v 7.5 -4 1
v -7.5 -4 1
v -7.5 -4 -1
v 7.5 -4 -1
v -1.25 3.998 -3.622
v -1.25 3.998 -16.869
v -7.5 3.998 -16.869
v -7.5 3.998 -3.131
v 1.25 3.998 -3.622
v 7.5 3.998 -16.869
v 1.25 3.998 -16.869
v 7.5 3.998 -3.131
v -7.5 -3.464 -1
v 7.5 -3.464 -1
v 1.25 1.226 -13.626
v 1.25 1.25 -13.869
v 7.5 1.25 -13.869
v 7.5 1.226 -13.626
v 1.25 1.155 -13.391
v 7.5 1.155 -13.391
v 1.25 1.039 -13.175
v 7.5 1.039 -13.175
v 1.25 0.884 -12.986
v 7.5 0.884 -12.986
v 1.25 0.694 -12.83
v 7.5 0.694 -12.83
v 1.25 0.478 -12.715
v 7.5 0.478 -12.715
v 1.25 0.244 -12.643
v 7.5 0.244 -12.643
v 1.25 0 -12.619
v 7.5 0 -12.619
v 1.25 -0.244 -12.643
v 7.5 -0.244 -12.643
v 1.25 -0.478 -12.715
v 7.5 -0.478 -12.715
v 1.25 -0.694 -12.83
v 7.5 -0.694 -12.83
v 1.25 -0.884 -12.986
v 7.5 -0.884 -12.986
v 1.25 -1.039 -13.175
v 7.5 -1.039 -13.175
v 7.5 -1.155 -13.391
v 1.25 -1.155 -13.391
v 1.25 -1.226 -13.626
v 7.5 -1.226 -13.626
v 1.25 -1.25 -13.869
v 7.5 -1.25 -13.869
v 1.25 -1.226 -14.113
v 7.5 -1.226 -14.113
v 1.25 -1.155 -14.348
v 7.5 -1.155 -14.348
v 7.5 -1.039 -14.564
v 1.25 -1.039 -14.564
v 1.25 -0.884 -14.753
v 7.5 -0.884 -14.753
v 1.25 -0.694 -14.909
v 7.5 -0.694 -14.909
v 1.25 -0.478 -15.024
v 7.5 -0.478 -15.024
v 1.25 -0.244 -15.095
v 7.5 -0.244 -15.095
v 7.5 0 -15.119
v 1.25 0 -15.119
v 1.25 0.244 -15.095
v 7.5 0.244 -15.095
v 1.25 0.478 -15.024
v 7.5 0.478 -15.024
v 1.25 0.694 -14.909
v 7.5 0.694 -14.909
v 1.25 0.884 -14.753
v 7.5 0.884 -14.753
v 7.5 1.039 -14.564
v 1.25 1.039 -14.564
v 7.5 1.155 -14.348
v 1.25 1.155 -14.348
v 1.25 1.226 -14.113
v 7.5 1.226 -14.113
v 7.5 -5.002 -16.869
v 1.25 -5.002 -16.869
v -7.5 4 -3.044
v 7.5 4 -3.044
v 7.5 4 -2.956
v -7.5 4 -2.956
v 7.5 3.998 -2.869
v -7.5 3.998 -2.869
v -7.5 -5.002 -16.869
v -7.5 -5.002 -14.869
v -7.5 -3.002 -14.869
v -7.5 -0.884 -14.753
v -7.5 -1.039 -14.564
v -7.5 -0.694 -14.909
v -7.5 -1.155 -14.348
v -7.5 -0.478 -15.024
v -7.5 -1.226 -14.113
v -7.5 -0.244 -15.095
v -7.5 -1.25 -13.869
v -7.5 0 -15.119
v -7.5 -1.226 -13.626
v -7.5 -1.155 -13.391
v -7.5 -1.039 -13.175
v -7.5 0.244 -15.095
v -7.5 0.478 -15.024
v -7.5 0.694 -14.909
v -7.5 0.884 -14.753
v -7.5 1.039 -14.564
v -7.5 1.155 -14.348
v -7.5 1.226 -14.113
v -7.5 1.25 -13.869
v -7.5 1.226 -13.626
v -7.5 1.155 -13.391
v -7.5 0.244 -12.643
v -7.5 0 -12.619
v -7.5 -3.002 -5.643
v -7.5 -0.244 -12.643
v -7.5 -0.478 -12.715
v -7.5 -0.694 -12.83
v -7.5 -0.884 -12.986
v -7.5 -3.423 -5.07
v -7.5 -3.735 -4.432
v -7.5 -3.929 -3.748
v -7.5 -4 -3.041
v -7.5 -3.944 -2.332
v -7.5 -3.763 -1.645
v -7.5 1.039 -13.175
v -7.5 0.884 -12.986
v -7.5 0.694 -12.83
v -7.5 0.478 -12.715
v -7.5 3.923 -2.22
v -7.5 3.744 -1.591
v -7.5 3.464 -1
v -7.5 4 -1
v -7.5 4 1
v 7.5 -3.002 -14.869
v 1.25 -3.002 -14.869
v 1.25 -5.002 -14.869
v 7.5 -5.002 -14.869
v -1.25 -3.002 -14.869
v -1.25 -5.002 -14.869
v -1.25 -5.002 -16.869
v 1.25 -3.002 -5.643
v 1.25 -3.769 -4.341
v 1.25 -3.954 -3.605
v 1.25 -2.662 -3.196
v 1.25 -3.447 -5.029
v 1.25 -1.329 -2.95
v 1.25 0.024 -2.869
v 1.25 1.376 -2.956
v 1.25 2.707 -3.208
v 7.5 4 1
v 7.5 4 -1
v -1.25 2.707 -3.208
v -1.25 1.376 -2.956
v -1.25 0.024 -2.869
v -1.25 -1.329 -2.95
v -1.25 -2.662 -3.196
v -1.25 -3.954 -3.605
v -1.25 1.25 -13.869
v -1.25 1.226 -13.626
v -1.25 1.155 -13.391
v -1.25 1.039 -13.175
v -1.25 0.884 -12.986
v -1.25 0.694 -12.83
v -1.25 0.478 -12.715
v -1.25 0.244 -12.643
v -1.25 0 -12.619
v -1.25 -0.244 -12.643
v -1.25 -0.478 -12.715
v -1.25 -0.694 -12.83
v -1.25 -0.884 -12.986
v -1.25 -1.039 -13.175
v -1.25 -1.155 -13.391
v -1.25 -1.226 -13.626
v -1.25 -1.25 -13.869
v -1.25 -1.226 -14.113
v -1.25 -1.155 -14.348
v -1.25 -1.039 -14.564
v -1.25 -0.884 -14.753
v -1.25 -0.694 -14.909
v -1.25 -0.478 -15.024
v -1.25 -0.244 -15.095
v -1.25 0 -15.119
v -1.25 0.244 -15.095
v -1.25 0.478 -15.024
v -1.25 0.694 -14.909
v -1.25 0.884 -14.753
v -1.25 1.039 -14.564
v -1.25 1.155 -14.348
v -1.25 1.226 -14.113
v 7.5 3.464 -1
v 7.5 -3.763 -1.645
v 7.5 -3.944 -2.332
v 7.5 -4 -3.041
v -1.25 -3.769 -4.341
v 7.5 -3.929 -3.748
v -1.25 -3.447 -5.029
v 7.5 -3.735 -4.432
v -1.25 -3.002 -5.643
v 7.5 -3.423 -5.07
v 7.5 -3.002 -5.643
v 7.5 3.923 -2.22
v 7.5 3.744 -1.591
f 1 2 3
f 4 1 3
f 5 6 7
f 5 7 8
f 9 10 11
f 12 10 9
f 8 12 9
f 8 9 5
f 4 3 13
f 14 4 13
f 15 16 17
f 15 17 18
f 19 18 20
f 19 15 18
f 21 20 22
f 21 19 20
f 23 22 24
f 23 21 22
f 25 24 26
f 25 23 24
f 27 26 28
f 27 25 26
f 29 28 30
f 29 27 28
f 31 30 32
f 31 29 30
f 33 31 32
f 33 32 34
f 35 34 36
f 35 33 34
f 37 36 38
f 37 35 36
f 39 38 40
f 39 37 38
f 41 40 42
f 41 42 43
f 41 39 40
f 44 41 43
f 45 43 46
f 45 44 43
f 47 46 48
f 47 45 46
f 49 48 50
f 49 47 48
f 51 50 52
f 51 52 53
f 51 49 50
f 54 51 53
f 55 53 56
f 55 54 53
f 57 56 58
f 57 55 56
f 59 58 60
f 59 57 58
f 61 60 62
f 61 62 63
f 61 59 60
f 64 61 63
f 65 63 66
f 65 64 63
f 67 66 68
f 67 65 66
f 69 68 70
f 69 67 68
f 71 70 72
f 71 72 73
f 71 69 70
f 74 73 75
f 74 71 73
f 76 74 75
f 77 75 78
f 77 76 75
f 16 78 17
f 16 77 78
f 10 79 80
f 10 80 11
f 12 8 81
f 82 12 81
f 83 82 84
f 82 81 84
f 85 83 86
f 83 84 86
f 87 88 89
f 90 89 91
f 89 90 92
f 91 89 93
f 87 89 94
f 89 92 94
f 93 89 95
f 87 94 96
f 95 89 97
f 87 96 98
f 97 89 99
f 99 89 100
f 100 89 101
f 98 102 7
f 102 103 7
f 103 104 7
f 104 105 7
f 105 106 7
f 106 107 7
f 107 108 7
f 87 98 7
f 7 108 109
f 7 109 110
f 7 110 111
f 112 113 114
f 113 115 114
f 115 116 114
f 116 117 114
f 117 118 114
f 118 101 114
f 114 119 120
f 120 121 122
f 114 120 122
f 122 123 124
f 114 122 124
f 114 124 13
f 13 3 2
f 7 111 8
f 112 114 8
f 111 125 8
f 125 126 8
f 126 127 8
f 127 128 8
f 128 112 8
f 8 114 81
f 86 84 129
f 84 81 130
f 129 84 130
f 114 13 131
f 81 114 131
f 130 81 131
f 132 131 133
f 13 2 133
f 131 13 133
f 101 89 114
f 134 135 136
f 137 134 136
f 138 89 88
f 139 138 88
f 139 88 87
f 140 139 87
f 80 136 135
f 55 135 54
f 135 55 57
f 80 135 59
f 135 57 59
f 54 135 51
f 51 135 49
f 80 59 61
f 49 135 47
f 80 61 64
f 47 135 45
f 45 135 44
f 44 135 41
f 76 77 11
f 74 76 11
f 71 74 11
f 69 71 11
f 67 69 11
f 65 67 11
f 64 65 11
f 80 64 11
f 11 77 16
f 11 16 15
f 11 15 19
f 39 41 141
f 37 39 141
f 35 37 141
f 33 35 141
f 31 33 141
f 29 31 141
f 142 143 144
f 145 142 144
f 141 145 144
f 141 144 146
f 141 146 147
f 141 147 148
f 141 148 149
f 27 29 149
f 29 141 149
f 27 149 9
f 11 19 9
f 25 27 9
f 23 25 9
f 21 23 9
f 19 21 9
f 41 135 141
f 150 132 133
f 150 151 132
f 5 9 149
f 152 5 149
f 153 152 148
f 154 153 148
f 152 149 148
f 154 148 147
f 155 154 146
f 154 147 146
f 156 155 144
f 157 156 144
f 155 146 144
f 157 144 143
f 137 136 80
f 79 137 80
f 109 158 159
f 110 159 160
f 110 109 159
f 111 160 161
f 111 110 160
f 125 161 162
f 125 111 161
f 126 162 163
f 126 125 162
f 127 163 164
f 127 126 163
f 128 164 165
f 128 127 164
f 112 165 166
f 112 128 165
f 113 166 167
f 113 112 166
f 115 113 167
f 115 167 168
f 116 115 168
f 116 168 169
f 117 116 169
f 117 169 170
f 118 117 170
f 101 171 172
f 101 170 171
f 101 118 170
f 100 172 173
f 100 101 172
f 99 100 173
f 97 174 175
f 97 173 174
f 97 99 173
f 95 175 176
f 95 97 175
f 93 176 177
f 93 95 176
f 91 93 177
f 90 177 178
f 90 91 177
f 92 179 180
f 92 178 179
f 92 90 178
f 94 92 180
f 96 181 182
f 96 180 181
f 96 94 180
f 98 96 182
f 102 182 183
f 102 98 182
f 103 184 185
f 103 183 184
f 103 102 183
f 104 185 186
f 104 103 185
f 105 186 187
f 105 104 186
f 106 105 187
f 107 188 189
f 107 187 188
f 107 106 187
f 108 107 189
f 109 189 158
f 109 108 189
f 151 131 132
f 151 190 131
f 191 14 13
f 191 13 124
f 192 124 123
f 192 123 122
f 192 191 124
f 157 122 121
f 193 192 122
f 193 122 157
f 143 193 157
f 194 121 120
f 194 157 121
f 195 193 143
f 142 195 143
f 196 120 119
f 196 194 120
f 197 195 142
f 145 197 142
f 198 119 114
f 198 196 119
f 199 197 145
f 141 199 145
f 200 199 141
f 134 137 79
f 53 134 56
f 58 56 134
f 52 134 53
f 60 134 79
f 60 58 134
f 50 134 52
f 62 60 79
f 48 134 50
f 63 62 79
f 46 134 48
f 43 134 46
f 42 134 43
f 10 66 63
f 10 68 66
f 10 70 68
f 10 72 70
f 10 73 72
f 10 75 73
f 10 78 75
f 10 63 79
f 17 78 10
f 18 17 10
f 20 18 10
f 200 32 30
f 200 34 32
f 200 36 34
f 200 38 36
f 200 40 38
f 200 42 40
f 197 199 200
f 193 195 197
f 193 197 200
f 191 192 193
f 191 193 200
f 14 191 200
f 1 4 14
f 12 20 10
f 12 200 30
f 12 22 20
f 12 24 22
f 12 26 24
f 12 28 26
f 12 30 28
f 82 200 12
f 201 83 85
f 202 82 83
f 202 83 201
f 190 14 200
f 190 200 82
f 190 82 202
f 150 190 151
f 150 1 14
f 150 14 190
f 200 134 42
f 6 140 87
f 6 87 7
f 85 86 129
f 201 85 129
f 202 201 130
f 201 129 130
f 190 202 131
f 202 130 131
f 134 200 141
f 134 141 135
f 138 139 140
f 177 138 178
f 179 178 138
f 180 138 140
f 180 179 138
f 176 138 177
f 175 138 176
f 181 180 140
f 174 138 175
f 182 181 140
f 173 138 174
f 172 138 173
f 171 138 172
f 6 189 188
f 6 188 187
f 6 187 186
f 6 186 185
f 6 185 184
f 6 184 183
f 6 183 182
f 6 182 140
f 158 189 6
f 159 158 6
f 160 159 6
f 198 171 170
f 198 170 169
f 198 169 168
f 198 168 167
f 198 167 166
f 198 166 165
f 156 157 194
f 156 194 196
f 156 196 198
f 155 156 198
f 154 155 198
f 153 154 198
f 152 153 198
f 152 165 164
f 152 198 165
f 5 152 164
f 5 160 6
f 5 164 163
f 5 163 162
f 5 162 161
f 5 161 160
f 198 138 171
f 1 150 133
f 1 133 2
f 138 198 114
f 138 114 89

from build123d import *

# Parameters (mm, degrees)
F0_R     = 1.25
F1_DEPTH = 7.5
F2_R     = 11
F3_DEPTH = 1.25


# Not quite as in the source:
# - a feature of the source that left no trace in its solid (it failed there, or was rolled back) is left out


with BuildPart() as f1:
    # F0 (on Right) → F1 (new body, symmetric)
    with BuildSketch(Plane.YZ):
        with BuildLine():
            Line((4, -1), (4, 1))
            Line((4, 1), (-4, 1))
            Line((-4, 1), (-4, -1))
            Line((-4, -1), (-3.4641016151, -1))
            ThreePointArc((-3.4641016151, -1), (-3.9803488917, -3.39600846), (-3.0021324352, -5.6433313908))
            Line((-3.0021324352, -5.6433313908), (-3.0021324352, -14.8694054575))
            Line((-3.0021324352, -14.8694054575), (-5.0021324352, -14.8694054575))
            Line((-5.0021324352, -14.8694054575), (-5.0021324352, -16.8694054575))
            Line((-5.0021324352, -16.8694054575), (3.9978675648, -16.8694054575))
            Line((3.9978675648, -16.8694054575), (3.9978675648, -14.8694054575))
            Line((3.9978675648, -14.8694054575), (3.9978675648, -3.1305945425))
            Line((3.9978675648, -3.1305945425), (3.9978675648, -2.8694054575))
            ThreePointArc((3.9978675648, -2.8694054575), (3.846285897, -1.901781079), (3.4641016151, -1))
            Line((3.4641016151, -1), (4, -1))
        make_face()
        with Locations((0, -13.8694054575)):
            Circle(F0_R, mode=Mode.SUBTRACT)
        with BuildLine():
            ThreePointArc((3.9978675648, -3.1305945425), (4, -3), (3.9978675648, -2.8694054575))
            Line((3.9978675648, -2.8694054575), (3.9978675648, -3.1305945425))
        make_face()
    extrude(amount=F1_DEPTH, both=True)

    # F2 (on Right) → F3 (cut, symmetric)
    with BuildSketch(Plane.YZ):
        with Locations((0, -13.8694054575)):
            Circle(F2_R)
    extrude(amount=F3_DEPTH, both=True, mode=Mode.SUBTRACT)


solid = f1.part
